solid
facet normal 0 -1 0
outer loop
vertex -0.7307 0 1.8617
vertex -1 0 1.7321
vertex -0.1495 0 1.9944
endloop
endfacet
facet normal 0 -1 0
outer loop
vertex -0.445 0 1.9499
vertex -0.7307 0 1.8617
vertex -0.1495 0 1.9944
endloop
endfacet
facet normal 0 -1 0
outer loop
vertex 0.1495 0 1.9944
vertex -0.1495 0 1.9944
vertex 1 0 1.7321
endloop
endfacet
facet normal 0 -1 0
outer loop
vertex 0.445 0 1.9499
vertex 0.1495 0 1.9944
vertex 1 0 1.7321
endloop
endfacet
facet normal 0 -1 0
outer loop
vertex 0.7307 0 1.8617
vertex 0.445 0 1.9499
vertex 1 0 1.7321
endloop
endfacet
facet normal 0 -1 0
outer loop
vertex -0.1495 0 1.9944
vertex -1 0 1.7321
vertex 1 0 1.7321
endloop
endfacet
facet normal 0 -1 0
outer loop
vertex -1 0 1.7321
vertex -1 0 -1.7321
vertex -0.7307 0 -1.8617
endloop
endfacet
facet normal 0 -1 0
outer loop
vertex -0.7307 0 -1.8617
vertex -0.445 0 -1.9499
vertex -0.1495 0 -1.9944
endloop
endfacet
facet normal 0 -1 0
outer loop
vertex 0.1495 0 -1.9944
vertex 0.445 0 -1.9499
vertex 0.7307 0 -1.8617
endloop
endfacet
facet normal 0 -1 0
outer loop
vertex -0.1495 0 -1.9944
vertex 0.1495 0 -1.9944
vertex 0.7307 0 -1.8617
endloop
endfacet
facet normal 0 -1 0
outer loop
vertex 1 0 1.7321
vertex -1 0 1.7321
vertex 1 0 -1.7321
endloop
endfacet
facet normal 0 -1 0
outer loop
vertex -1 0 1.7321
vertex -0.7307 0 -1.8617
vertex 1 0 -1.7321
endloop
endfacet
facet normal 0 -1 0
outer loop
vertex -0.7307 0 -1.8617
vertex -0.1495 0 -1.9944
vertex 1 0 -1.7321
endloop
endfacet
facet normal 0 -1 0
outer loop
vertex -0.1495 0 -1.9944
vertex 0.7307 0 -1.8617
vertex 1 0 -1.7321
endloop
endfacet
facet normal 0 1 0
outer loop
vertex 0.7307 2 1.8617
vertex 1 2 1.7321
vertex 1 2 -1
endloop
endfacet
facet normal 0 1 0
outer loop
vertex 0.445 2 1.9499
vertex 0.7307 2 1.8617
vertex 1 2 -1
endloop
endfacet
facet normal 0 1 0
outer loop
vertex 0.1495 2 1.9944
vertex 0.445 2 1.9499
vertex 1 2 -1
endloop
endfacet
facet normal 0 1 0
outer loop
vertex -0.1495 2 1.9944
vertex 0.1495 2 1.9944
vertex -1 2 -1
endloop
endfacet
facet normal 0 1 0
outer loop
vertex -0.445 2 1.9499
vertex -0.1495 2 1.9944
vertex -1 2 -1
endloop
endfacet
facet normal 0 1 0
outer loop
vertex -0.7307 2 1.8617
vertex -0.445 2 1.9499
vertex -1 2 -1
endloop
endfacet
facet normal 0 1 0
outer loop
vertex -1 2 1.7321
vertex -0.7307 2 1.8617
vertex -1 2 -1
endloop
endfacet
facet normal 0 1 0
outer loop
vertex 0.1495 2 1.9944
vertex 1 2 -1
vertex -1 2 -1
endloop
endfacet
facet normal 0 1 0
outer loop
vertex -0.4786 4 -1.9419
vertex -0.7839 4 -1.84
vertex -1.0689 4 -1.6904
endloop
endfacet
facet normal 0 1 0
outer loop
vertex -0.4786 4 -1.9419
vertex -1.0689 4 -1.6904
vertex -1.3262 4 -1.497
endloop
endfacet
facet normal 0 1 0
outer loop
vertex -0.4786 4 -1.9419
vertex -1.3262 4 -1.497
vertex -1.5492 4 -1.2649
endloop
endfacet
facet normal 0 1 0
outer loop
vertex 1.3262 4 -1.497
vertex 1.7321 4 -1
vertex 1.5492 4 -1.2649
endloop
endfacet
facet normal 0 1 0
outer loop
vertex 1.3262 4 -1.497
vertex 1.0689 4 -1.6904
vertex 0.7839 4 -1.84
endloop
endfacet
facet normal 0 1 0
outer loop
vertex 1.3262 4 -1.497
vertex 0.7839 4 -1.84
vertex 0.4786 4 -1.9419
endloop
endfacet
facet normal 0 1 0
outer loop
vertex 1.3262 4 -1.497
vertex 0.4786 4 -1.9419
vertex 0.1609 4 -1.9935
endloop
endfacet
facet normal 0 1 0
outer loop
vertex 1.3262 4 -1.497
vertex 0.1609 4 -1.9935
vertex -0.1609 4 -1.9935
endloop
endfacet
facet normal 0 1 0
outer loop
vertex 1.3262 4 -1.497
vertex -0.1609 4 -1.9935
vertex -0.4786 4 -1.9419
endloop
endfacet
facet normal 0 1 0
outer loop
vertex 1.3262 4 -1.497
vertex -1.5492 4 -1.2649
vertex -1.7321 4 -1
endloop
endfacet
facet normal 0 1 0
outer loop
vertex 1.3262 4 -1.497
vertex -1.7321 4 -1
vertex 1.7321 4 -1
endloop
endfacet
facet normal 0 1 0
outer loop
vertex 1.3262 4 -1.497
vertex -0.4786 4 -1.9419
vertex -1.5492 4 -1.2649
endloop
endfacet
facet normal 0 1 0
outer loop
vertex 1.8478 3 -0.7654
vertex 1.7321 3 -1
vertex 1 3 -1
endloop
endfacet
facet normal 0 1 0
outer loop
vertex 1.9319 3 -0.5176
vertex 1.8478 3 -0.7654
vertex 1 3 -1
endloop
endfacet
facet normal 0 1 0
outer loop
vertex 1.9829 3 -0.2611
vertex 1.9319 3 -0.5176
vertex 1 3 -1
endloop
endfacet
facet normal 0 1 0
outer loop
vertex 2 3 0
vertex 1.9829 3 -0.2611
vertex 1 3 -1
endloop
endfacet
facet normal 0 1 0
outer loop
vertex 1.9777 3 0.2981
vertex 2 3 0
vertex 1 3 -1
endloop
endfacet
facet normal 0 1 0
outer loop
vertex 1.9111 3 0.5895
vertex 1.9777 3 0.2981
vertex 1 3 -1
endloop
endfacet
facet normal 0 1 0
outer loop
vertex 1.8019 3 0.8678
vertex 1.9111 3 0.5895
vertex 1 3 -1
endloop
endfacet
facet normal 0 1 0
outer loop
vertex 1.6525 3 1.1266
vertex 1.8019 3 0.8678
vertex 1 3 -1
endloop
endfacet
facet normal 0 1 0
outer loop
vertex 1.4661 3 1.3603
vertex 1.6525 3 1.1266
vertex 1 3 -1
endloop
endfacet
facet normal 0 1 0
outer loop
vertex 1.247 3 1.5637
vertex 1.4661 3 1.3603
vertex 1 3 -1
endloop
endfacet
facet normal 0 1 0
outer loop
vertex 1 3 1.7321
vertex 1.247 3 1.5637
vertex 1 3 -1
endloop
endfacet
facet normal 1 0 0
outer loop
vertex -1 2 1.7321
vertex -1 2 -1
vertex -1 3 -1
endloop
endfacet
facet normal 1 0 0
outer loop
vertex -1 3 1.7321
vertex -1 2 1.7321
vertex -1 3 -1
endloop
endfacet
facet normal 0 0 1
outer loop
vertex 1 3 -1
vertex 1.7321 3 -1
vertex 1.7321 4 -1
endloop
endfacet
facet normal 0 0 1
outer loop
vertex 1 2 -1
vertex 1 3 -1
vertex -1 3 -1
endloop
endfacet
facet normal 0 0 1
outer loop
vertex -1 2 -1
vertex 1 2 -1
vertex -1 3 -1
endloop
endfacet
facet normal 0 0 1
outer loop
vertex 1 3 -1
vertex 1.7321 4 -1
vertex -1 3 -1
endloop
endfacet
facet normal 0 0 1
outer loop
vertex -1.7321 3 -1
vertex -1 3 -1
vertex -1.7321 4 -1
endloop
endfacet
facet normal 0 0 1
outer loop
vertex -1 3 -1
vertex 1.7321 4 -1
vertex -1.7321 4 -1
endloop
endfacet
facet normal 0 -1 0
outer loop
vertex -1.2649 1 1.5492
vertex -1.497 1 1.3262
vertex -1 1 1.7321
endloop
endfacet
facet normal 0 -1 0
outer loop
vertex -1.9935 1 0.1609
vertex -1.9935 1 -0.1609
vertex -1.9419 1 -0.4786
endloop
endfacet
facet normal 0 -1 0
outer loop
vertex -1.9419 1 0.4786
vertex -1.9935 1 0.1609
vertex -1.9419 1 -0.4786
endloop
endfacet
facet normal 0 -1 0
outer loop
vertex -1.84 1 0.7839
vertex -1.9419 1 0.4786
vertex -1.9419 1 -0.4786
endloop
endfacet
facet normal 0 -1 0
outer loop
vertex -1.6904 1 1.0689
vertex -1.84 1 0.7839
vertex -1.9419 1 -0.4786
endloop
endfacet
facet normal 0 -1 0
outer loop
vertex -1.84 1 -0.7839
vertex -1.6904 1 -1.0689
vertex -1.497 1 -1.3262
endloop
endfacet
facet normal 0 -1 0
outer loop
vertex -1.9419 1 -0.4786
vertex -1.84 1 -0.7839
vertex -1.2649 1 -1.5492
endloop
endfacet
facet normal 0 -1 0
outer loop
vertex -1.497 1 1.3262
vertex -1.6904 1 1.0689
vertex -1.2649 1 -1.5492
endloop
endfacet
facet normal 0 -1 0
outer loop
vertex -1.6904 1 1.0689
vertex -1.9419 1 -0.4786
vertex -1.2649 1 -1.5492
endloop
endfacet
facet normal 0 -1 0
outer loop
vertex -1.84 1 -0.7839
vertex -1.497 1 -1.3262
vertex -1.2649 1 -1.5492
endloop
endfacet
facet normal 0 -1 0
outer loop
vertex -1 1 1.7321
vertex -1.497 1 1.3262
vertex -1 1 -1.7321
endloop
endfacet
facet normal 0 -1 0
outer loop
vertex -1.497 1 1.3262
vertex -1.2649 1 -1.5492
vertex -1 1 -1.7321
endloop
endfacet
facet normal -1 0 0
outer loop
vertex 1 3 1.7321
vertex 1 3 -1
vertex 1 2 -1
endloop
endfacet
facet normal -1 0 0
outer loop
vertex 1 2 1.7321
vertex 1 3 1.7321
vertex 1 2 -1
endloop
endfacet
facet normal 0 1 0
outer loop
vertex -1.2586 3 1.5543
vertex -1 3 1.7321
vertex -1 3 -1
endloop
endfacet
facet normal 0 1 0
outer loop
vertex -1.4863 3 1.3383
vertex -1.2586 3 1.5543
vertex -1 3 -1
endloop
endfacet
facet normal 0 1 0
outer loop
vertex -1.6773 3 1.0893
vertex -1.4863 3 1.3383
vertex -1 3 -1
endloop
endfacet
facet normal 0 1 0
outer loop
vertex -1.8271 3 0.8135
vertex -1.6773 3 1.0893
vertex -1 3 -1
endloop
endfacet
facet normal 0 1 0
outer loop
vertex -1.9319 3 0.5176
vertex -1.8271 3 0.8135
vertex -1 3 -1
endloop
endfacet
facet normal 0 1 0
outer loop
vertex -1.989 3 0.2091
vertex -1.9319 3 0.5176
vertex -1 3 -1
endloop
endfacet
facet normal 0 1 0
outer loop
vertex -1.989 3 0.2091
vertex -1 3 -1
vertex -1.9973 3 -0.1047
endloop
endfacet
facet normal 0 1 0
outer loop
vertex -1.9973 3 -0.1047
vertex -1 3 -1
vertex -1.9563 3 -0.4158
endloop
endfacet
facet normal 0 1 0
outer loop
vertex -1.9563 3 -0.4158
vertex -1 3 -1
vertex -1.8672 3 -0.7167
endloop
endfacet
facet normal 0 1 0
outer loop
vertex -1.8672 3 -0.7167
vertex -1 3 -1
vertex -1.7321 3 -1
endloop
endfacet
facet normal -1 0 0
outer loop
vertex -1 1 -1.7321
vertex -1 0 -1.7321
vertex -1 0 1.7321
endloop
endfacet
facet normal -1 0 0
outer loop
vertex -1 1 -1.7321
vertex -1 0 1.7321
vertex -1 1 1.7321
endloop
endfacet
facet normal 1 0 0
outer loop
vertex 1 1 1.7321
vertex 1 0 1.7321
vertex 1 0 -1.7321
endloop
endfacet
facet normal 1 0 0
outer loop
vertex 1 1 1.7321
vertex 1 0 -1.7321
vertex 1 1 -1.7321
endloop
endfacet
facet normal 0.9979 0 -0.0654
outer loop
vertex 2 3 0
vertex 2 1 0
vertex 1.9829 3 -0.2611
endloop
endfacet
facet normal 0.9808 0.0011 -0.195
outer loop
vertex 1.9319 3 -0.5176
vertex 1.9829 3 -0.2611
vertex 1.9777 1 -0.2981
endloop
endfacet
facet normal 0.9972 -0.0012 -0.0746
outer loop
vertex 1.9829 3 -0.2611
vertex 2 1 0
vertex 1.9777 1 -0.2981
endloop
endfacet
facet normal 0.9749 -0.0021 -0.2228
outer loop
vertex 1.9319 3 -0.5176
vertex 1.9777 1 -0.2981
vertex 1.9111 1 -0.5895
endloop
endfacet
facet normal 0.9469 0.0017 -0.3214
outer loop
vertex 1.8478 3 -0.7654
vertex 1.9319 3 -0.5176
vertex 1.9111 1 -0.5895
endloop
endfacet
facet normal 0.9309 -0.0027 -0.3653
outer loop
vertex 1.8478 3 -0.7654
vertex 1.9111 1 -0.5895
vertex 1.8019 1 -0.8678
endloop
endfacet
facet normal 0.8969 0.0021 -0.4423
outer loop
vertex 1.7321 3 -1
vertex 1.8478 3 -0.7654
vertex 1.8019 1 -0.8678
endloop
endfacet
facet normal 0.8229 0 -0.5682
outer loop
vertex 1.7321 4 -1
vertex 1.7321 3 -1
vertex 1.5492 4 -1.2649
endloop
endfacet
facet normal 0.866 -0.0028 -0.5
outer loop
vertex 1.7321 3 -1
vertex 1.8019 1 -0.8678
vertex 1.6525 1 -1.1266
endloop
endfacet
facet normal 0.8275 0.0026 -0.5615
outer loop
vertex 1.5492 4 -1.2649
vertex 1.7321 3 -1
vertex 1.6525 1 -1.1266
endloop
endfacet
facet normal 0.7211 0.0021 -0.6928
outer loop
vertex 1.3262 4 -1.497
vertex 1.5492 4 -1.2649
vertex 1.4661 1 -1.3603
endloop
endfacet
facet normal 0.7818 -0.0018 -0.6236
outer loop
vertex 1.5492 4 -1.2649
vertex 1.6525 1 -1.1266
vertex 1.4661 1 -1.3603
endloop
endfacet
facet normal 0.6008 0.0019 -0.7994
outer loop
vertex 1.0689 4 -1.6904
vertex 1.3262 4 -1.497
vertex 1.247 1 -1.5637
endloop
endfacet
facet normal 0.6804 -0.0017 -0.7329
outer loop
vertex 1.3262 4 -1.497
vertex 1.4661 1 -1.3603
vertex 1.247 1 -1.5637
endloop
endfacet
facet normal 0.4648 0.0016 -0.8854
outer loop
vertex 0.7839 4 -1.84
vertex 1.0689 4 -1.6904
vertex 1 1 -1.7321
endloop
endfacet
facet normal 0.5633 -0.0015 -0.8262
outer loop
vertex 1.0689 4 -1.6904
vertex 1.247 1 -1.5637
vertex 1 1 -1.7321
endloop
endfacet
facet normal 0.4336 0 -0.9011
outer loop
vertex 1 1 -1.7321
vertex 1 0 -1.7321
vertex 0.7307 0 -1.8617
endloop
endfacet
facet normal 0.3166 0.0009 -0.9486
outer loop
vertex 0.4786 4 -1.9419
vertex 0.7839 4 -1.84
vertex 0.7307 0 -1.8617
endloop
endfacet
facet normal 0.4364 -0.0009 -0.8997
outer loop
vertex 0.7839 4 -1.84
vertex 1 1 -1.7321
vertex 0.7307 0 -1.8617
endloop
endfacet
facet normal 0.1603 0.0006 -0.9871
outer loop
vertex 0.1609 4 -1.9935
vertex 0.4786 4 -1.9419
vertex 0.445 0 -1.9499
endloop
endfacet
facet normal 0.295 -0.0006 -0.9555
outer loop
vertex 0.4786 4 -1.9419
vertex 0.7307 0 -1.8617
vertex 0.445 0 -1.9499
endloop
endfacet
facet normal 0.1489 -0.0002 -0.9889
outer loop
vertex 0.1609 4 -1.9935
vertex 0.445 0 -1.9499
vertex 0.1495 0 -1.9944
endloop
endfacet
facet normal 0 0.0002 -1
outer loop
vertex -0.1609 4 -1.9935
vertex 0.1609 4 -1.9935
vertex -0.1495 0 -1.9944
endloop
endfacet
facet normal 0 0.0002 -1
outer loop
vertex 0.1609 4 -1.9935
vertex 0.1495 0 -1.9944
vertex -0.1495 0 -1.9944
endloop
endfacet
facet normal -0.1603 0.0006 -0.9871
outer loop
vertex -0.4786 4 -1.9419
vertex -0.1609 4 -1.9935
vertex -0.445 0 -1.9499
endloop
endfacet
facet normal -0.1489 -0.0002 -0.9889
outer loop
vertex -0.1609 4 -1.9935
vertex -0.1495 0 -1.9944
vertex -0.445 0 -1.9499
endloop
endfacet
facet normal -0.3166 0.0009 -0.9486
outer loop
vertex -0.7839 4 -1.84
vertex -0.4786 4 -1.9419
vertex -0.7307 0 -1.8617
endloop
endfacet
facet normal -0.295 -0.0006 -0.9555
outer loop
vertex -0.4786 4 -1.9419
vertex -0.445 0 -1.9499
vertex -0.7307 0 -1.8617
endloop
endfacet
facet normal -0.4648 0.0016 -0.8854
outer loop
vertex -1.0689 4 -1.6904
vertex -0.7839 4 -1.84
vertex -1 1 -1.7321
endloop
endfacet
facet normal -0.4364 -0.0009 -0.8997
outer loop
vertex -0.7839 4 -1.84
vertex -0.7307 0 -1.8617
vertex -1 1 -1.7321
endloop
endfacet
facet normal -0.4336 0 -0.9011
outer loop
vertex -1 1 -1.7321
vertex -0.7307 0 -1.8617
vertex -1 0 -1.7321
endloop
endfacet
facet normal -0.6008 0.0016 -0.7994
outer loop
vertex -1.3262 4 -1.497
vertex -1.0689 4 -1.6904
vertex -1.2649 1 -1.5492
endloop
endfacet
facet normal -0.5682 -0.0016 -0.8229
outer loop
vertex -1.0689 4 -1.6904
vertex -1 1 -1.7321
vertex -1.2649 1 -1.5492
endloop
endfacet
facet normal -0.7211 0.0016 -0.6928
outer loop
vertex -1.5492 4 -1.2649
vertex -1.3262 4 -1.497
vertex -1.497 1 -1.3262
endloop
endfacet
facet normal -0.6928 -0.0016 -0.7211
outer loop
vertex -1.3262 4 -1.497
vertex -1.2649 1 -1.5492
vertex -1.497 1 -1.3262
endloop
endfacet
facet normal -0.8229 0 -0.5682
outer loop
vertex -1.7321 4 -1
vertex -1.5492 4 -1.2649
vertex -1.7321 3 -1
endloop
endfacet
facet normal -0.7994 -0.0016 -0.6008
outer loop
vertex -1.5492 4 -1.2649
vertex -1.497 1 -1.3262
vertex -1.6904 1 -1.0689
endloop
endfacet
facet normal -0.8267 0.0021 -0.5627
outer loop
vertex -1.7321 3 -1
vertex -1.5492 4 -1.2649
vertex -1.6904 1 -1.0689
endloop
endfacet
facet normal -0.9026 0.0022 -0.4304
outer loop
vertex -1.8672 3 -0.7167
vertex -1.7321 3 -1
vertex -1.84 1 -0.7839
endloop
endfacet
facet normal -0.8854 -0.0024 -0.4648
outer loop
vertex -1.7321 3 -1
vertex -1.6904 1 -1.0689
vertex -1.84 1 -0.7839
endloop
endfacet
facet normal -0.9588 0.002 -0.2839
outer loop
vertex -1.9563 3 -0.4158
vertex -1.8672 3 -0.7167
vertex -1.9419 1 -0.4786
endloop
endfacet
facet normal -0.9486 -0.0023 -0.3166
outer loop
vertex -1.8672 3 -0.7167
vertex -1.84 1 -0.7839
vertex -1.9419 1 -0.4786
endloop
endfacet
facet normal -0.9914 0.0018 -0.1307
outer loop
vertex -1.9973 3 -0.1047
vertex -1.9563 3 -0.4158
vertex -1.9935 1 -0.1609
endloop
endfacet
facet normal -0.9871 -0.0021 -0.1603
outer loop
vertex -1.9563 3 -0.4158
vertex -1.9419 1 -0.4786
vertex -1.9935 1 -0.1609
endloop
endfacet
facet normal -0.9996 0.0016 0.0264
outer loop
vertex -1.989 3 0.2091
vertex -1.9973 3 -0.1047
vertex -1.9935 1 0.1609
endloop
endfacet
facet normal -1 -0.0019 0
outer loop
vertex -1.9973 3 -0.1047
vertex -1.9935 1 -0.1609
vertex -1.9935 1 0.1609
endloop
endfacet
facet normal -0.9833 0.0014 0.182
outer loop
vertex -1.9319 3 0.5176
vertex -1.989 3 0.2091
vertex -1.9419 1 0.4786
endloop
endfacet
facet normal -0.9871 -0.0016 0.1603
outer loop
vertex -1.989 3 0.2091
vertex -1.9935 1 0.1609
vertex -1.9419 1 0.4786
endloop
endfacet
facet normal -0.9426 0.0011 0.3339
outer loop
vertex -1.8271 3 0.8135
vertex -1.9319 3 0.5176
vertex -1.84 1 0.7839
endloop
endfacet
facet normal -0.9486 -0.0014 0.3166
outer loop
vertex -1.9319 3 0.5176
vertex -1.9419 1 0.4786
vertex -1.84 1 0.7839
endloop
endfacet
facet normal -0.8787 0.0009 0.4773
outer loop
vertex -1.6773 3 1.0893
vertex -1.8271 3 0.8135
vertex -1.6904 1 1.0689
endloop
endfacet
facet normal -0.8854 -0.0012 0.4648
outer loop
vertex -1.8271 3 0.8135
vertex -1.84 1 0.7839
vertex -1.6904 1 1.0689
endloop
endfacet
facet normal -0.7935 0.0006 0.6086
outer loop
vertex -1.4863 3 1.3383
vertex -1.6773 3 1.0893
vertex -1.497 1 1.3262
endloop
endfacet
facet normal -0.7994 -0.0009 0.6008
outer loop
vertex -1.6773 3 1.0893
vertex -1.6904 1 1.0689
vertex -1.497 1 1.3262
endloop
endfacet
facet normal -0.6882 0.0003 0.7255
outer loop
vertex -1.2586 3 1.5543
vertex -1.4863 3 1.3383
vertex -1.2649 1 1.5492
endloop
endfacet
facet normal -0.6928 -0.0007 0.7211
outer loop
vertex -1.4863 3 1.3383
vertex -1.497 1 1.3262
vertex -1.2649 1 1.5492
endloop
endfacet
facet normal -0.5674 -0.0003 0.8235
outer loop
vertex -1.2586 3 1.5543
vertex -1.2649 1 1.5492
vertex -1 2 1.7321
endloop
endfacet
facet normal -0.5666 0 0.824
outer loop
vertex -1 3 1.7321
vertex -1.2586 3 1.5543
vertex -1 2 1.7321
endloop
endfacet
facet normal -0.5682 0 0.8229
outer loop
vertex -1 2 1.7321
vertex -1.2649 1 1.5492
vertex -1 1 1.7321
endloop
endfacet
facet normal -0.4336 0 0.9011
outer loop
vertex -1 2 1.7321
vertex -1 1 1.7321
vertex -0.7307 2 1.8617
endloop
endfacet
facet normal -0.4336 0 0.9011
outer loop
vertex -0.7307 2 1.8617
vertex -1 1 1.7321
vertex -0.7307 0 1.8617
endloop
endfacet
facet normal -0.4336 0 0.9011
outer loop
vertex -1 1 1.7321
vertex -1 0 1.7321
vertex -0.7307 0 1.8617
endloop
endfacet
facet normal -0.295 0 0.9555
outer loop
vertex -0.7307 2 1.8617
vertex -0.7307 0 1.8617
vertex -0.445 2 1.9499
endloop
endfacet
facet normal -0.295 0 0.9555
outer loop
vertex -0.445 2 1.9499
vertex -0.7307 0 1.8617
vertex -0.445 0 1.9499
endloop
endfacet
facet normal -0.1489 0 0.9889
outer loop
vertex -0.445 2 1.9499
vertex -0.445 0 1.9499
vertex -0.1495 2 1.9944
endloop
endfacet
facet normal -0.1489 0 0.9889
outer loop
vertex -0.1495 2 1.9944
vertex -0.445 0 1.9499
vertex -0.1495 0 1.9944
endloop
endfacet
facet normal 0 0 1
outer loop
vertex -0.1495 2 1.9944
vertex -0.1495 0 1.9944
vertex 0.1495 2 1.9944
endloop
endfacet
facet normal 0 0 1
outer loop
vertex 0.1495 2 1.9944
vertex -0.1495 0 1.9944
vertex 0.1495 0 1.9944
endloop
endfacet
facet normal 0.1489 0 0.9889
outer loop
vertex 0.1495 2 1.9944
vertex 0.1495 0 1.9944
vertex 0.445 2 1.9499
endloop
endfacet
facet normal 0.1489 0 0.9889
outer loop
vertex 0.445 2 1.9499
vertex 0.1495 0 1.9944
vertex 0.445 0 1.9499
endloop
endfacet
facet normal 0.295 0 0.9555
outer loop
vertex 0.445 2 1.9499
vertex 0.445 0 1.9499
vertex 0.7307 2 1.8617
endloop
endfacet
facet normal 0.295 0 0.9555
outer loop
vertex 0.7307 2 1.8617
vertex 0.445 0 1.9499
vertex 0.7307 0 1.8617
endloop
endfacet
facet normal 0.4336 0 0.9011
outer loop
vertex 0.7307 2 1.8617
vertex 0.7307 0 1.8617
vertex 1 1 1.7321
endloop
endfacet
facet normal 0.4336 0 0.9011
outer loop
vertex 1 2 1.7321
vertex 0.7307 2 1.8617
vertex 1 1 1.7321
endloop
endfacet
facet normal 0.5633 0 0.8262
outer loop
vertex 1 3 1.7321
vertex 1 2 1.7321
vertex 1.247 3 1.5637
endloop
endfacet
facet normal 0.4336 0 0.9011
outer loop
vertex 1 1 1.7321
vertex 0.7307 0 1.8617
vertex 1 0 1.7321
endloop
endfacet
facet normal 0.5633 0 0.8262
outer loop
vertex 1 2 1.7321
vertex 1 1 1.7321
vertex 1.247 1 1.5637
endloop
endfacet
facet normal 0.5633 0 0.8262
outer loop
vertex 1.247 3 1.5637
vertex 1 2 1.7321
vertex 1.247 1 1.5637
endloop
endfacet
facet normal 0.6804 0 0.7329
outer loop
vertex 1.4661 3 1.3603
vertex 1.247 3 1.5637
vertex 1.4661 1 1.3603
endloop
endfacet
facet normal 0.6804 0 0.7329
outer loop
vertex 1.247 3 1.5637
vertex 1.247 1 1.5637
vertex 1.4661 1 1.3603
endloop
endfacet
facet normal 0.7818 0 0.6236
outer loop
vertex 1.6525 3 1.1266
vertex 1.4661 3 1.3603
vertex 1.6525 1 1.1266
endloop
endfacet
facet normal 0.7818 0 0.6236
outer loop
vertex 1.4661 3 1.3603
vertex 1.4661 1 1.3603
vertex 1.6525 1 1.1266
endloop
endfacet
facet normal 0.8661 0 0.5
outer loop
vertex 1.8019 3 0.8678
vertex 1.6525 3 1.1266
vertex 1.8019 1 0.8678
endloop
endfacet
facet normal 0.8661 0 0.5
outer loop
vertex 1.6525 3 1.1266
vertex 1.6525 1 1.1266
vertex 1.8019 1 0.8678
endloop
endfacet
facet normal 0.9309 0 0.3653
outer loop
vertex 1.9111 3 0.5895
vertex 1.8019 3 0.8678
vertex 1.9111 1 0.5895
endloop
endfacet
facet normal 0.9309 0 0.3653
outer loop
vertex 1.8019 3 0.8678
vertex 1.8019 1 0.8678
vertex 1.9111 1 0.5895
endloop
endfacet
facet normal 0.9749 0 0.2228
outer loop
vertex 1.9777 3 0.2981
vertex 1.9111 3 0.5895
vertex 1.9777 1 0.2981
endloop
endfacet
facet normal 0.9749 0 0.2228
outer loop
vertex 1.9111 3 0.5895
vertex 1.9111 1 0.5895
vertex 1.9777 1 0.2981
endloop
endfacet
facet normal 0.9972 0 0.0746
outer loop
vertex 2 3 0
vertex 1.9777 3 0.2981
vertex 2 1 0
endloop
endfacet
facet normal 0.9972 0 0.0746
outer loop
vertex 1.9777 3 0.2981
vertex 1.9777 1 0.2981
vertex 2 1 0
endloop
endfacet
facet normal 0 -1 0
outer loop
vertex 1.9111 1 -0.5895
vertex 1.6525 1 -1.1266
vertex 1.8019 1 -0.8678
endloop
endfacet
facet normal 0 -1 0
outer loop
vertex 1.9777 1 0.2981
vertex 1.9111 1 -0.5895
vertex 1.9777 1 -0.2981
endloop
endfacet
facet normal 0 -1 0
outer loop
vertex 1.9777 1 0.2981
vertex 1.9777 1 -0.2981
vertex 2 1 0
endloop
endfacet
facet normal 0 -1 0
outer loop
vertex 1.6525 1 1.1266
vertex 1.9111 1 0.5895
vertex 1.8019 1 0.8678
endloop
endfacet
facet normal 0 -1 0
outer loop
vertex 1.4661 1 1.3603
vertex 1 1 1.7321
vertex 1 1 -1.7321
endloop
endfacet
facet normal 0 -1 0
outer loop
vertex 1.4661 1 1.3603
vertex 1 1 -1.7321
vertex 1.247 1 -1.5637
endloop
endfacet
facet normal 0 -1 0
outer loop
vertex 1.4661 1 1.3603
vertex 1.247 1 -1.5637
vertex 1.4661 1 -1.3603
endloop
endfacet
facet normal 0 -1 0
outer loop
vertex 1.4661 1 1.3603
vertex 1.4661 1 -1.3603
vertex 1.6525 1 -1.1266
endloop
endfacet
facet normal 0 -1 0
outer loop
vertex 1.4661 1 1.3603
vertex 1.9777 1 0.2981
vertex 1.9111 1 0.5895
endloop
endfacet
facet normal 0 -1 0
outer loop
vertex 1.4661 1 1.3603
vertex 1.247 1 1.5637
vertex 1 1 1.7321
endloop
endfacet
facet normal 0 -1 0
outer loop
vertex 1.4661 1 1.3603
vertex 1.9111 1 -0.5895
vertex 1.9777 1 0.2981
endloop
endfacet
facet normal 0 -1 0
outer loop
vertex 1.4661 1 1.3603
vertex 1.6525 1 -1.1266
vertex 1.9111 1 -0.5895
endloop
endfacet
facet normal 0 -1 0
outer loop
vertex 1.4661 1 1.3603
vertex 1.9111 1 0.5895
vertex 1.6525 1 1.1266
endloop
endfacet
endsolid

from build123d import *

# Parameters (mm, degrees)
SKETCH1_R               = 2
BOSS_EXTRUDE1_DEPTH     = 4
SKETCH2_W               = 1
SKETCH2_H               = 1
CUT_EXTRUDE1_DEPTH      = 2
CUT_EXTRUDE2_DEPTH      = 4
CUT_EXTRUDE2_DEPTH_BACK = 1


with BuildPart() as part:
    # Sketch1 → Boss-Extrude1 (new body)
    with BuildSketch(Plane(origin=(0, 0, 0), x_dir=(1, 0, 0), z_dir=(0, 1, 0))):
        Circle(SKETCH1_R)
    extrude(amount=BOSS_EXTRUDE1_DEPTH)

    # Sketch2 → Cut-Extrude1 (cut, symmetric)
    with BuildSketch(Plane.XY):
        with Locations((-1.5, 0.5)):
            Rectangle(SKETCH2_W, SKETCH2_H)
        with Locations((1.5, 0.5)):
            Rectangle(SKETCH2_W, SKETCH2_H)
    extrude(amount=CUT_EXTRUDE1_DEPTH, both=True, mode=Mode.SUBTRACT)

    # Sketch3 → Cut-Extrude2 (cut, two sides)
    with BuildSketch(Plane.XY) as cut_extrude2_sk:
        Polygon((-2, 4), (2, 4), (2, 3), (1, 3), (1, 2), (-1, 2), (-1, 3), (-2, 3), align=None)
    extrude(amount=CUT_EXTRUDE2_DEPTH, mode=Mode.SUBTRACT)
    extrude(cut_extrude2_sk.sketch, amount=-CUT_EXTRUDE2_DEPTH_BACK, mode=Mode.SUBTRACT)


solid = part.part
